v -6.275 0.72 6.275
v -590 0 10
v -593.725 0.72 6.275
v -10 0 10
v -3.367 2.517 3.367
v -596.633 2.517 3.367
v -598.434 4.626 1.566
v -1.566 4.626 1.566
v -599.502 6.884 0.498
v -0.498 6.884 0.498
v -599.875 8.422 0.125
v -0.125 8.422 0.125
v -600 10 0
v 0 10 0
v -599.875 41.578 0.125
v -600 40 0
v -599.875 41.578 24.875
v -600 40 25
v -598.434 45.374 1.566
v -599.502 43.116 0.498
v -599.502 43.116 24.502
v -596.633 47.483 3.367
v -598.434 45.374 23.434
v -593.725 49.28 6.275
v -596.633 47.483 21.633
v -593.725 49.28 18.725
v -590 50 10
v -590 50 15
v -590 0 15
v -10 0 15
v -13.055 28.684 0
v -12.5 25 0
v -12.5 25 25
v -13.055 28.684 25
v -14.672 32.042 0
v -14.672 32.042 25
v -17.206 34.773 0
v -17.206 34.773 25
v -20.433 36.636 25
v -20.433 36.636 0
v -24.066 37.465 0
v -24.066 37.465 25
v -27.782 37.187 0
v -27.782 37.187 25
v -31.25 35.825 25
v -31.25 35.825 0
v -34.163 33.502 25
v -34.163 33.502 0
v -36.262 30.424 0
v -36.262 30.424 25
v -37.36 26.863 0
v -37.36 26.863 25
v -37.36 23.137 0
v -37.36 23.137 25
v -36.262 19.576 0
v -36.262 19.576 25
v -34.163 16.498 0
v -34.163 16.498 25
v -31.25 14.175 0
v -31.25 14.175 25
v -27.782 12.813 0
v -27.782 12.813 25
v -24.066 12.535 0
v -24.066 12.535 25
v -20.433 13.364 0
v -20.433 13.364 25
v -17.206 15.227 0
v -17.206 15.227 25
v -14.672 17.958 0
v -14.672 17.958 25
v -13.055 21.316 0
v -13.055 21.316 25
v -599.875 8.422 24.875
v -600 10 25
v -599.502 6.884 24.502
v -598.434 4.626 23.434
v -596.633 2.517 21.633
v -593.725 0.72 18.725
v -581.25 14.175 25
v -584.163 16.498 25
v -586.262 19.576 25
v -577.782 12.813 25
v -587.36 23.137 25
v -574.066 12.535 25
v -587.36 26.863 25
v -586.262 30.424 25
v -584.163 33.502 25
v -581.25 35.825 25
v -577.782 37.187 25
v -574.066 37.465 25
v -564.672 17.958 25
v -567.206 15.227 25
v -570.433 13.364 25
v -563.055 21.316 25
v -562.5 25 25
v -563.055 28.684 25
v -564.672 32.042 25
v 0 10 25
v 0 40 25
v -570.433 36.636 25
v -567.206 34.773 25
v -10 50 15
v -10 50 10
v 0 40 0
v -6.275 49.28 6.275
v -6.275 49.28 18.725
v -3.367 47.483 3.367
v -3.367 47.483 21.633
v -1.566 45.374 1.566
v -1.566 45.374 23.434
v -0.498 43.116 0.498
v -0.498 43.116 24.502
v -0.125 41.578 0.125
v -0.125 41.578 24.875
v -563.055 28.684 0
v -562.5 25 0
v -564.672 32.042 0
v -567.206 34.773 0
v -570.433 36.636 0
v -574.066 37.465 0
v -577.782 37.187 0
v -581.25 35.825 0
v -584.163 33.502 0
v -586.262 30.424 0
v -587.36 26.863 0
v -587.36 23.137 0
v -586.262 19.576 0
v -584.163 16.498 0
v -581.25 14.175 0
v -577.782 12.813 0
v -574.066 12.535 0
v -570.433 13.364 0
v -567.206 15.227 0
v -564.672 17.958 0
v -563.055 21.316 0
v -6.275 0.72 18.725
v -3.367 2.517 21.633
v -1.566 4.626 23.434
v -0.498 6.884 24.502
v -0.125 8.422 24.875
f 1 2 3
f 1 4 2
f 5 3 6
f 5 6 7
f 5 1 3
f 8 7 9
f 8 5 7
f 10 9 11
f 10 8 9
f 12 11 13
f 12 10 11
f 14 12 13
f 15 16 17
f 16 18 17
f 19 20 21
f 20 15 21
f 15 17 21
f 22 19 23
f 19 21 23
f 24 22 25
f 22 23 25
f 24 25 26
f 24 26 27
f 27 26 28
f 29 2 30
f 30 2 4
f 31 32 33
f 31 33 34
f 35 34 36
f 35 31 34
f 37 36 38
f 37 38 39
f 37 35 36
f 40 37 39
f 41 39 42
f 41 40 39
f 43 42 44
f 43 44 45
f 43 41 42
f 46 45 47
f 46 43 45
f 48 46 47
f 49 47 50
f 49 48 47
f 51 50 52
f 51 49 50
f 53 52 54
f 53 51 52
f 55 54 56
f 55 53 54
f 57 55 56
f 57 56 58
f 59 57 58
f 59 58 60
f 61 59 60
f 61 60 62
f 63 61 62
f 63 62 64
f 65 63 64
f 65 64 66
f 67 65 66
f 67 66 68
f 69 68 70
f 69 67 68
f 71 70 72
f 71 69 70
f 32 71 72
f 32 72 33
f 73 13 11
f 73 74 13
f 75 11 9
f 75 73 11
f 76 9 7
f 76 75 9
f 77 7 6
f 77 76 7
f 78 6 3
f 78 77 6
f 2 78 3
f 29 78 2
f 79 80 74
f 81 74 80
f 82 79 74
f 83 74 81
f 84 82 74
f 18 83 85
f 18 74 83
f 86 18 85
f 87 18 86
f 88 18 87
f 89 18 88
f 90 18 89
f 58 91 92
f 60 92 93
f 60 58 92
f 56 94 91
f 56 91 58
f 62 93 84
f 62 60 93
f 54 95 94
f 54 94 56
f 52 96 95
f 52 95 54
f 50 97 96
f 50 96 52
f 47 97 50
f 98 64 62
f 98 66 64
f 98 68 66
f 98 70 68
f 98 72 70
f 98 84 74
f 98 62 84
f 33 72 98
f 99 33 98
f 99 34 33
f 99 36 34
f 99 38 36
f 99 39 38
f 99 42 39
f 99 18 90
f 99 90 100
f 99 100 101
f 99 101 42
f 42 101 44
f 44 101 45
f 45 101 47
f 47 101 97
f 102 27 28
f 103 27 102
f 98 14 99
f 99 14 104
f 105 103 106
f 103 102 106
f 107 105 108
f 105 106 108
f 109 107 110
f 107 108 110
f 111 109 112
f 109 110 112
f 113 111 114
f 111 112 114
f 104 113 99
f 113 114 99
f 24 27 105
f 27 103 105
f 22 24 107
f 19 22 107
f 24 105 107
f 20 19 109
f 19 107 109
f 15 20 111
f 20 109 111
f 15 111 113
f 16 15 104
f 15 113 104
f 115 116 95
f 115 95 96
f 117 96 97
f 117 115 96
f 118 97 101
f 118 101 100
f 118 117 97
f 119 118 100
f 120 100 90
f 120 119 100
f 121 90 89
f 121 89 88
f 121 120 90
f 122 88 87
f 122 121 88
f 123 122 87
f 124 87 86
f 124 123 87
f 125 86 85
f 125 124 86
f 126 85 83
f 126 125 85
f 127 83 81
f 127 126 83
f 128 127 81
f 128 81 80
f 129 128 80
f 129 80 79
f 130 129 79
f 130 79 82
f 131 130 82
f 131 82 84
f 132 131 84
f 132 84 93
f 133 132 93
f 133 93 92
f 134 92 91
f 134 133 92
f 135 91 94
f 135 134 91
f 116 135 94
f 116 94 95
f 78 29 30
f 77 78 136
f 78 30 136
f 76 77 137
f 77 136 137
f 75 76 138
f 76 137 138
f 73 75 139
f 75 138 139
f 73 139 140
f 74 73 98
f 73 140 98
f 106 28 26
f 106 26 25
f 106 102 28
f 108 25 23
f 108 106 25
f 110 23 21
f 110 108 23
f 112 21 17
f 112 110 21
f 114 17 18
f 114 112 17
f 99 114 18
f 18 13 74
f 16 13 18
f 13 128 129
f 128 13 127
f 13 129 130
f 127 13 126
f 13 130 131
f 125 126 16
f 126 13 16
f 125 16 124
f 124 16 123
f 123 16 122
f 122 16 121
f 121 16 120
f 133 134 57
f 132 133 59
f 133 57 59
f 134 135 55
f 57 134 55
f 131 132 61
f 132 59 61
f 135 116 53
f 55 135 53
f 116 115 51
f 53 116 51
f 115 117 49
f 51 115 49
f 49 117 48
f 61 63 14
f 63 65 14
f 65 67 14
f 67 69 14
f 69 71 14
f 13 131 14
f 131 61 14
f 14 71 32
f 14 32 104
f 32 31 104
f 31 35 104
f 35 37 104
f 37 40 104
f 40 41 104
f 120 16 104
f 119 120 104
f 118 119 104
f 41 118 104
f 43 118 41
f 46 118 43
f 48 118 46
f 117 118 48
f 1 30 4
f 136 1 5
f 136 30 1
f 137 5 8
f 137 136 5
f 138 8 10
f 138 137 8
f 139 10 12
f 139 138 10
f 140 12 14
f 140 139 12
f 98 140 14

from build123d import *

# Parameters (mm, degrees)
SKETCH1_W           = 600
SKETCH1_H           = 50
SKETCH1_R           = 12.5
BOSS_EXTRUDE2_DEPTH = 25
FILLET2_R           = 10


with BuildPart() as part:
    # Sketch1 → Boss-Extrude2 (new body)
    with BuildSketch(Plane.XY):
        with Locations((-300, 25)):
            Rectangle(SKETCH1_W, SKETCH1_H)
        with Locations((-575, 25)):
            Circle(SKETCH1_R, mode=Mode.SUBTRACT)
        with Locations((-25, 25)):
            Circle(SKETCH1_R, mode=Mode.SUBTRACT)
    extrude(amount=BOSS_EXTRUDE2_DEPTH)

    # Fillet2
    fillet2_edges = [part.edges().sort_by_distance(p)[0] for p in [
        (-300, 0, 25),
        (-300, 0, 0),
        (-300, 50, 0),
        (-300, 50, 25),
        (0, 0, 12.5),
        (-600, 0, 12.5),
        (-600, 50, 12.5),
        (0, 50, 12.5),
    ]]
    fillet(fillet2_edges, radius=FILLET2_R)


solid = part.part
